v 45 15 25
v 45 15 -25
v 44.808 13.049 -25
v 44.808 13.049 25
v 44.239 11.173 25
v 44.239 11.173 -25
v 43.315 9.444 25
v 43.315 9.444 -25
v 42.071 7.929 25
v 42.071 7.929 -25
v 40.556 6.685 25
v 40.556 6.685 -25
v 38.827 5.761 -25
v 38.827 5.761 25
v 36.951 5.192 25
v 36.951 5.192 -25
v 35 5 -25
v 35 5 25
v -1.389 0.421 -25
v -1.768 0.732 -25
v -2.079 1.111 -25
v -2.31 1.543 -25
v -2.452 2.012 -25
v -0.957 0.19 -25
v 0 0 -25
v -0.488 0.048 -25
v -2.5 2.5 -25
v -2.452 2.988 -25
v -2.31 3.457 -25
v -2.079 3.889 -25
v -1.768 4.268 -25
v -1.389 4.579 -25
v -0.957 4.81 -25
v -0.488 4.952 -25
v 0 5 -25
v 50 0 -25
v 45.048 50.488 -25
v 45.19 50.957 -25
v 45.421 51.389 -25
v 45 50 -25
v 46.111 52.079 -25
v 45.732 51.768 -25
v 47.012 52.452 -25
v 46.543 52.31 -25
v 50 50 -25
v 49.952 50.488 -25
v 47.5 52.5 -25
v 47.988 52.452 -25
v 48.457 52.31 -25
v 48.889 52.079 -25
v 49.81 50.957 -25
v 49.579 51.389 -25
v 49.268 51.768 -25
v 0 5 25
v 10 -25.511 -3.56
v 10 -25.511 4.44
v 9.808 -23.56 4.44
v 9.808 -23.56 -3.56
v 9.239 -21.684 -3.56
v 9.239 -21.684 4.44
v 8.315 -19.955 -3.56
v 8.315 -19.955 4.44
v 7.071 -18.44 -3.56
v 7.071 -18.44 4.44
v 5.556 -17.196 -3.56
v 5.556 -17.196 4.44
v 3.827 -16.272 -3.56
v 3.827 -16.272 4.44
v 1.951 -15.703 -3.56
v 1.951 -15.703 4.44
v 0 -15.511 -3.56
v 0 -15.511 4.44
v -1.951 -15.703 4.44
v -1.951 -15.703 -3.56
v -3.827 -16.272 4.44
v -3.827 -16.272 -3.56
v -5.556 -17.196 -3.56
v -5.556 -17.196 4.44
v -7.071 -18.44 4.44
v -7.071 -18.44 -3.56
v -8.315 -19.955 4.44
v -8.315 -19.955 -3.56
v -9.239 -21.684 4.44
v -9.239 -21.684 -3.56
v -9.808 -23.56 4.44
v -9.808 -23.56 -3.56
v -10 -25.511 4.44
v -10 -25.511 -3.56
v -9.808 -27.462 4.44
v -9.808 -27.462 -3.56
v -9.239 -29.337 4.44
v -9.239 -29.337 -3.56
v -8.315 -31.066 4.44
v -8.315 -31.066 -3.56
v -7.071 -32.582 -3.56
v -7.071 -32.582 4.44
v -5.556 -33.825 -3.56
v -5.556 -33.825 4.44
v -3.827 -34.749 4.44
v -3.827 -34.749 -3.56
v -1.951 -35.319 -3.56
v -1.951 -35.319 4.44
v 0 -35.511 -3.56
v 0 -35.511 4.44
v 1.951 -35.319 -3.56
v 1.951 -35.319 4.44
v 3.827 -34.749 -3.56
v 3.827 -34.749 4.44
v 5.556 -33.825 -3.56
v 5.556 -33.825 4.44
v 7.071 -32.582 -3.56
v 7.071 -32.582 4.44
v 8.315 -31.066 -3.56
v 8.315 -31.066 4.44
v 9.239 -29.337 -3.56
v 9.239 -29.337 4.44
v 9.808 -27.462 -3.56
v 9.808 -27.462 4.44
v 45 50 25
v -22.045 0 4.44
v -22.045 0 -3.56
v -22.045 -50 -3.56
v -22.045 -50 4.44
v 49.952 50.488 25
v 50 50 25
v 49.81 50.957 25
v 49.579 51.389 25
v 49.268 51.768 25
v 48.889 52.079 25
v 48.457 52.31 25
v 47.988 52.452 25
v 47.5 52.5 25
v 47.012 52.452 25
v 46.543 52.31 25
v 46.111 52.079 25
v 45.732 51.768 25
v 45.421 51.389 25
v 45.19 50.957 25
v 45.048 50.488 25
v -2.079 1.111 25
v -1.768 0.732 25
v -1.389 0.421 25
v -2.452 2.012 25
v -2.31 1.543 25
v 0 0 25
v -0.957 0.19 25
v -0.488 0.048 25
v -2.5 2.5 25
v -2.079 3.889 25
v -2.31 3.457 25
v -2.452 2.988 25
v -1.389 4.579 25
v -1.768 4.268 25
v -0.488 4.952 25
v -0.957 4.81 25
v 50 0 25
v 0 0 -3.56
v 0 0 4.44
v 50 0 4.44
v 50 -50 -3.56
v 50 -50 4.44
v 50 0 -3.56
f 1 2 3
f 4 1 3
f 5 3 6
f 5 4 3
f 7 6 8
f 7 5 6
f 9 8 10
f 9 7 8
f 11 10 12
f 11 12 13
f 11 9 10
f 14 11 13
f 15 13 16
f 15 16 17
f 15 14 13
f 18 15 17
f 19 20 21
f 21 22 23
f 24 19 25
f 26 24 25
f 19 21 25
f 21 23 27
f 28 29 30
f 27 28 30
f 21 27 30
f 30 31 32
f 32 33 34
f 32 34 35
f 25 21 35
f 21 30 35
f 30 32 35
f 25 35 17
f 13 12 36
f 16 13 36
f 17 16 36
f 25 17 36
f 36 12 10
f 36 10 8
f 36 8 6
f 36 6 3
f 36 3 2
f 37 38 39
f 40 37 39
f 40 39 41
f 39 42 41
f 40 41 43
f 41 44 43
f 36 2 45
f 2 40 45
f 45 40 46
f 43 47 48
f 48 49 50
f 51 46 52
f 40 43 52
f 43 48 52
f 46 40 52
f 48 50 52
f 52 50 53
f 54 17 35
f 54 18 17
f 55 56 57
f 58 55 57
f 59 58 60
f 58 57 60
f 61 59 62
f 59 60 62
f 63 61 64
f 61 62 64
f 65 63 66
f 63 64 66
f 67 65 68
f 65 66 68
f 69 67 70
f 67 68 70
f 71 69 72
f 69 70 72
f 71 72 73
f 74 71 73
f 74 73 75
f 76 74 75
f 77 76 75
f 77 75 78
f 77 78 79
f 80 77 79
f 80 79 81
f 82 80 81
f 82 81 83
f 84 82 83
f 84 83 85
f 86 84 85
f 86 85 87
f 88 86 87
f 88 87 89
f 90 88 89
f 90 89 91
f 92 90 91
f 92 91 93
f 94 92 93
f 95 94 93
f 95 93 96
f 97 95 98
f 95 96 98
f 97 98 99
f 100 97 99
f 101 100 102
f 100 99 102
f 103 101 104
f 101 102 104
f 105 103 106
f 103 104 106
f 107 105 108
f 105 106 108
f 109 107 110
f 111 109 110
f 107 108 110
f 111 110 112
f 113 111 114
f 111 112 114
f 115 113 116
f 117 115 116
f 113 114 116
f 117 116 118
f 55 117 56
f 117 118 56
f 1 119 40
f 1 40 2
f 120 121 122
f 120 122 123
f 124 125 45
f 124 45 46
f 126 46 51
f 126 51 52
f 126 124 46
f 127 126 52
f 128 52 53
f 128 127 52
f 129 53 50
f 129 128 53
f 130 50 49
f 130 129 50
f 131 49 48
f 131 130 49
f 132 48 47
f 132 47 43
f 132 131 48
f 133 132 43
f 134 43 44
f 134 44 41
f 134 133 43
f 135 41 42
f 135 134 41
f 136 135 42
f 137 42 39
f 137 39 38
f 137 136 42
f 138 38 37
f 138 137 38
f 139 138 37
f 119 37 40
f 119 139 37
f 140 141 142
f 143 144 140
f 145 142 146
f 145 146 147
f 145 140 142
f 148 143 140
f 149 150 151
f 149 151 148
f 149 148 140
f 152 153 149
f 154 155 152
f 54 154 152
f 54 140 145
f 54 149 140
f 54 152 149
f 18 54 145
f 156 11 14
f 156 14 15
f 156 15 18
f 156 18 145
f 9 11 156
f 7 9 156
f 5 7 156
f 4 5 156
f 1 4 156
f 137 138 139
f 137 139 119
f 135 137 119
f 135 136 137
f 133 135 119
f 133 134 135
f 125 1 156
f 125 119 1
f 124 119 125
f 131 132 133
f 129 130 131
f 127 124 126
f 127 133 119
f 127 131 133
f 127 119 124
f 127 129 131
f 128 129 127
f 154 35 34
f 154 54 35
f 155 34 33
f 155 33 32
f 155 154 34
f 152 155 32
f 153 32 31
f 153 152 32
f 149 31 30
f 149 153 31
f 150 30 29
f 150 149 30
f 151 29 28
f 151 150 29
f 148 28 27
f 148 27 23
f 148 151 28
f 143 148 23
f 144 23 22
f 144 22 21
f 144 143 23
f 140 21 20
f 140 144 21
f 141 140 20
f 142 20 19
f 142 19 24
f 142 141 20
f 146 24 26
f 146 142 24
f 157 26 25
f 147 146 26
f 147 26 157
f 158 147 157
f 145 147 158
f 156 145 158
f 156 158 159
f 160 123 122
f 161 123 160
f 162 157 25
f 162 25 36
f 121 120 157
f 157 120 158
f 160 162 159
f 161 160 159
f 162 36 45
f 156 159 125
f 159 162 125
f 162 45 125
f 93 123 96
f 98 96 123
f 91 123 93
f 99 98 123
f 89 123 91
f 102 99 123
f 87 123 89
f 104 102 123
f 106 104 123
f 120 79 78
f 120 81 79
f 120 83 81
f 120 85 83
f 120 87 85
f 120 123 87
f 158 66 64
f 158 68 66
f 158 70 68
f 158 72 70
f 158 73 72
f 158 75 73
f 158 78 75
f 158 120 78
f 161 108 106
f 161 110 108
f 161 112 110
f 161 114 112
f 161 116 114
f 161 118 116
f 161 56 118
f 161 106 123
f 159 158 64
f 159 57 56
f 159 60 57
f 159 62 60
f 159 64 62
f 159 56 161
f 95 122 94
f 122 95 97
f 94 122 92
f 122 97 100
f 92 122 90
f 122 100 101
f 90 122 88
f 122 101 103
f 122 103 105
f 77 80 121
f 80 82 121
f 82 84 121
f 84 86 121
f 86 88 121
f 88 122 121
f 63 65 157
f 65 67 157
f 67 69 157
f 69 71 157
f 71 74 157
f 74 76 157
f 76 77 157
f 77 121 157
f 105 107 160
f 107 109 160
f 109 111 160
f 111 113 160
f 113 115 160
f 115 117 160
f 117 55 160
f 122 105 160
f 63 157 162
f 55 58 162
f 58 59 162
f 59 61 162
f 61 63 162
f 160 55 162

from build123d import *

# Parameters (mm, degrees)
SALIENTE_EXTRUIR1_DEPTH = 25
CROQUIS2_W              = 72.044924806
CROQUIS2_H              = 8
SALIENTE_EXTRUIR2_DEPTH = 50
CROQUIS3_R              = 10
CORTAR_EXTRUIR1_DEPTH   = 50


with BuildPart() as part:
    # Croquis1 → Saliente-Extruir1 (new, symmetric)
    with BuildSketch(Plane.XY):
        with BuildLine():
            Line((0, 0), (50, 0))
            Line((50, 0), (50, 50))
            ThreePointArc((50, 50), (47.5, 52.5), (45, 50))
            Line((45, 50), (45, 15))
            ThreePointArc((45, 15), (42.071067812, 7.928932188), (35, 5))
            Line((35, 5), (0, 5))
            ThreePointArc((0, 5), (-2.5, 2.5), (0, 0))
        make_face()
    extrude(amount=SALIENTE_EXTRUIR1_DEPTH, both=True)

    # Croquis2 → Saliente-Extruir2 (add)
    with BuildSketch(Plane.XZ):
        with Locations((13.977537597, 0.439965546)):
            Rectangle(CROQUIS2_W, CROQUIS2_H)
    extrude(amount=SALIENTE_EXTRUIR2_DEPTH)

    # Croquis3 → Cortar-Extruir1 (cut)
    with BuildSketch(Plane.XY.offset(4.439965546)):
        with Locations((0, -25.510653739)):
            Circle(CROQUIS3_R)
    extrude(amount=-CORTAR_EXTRUIR1_DEPTH, mode=Mode.SUBTRACT)


solid = part.part
